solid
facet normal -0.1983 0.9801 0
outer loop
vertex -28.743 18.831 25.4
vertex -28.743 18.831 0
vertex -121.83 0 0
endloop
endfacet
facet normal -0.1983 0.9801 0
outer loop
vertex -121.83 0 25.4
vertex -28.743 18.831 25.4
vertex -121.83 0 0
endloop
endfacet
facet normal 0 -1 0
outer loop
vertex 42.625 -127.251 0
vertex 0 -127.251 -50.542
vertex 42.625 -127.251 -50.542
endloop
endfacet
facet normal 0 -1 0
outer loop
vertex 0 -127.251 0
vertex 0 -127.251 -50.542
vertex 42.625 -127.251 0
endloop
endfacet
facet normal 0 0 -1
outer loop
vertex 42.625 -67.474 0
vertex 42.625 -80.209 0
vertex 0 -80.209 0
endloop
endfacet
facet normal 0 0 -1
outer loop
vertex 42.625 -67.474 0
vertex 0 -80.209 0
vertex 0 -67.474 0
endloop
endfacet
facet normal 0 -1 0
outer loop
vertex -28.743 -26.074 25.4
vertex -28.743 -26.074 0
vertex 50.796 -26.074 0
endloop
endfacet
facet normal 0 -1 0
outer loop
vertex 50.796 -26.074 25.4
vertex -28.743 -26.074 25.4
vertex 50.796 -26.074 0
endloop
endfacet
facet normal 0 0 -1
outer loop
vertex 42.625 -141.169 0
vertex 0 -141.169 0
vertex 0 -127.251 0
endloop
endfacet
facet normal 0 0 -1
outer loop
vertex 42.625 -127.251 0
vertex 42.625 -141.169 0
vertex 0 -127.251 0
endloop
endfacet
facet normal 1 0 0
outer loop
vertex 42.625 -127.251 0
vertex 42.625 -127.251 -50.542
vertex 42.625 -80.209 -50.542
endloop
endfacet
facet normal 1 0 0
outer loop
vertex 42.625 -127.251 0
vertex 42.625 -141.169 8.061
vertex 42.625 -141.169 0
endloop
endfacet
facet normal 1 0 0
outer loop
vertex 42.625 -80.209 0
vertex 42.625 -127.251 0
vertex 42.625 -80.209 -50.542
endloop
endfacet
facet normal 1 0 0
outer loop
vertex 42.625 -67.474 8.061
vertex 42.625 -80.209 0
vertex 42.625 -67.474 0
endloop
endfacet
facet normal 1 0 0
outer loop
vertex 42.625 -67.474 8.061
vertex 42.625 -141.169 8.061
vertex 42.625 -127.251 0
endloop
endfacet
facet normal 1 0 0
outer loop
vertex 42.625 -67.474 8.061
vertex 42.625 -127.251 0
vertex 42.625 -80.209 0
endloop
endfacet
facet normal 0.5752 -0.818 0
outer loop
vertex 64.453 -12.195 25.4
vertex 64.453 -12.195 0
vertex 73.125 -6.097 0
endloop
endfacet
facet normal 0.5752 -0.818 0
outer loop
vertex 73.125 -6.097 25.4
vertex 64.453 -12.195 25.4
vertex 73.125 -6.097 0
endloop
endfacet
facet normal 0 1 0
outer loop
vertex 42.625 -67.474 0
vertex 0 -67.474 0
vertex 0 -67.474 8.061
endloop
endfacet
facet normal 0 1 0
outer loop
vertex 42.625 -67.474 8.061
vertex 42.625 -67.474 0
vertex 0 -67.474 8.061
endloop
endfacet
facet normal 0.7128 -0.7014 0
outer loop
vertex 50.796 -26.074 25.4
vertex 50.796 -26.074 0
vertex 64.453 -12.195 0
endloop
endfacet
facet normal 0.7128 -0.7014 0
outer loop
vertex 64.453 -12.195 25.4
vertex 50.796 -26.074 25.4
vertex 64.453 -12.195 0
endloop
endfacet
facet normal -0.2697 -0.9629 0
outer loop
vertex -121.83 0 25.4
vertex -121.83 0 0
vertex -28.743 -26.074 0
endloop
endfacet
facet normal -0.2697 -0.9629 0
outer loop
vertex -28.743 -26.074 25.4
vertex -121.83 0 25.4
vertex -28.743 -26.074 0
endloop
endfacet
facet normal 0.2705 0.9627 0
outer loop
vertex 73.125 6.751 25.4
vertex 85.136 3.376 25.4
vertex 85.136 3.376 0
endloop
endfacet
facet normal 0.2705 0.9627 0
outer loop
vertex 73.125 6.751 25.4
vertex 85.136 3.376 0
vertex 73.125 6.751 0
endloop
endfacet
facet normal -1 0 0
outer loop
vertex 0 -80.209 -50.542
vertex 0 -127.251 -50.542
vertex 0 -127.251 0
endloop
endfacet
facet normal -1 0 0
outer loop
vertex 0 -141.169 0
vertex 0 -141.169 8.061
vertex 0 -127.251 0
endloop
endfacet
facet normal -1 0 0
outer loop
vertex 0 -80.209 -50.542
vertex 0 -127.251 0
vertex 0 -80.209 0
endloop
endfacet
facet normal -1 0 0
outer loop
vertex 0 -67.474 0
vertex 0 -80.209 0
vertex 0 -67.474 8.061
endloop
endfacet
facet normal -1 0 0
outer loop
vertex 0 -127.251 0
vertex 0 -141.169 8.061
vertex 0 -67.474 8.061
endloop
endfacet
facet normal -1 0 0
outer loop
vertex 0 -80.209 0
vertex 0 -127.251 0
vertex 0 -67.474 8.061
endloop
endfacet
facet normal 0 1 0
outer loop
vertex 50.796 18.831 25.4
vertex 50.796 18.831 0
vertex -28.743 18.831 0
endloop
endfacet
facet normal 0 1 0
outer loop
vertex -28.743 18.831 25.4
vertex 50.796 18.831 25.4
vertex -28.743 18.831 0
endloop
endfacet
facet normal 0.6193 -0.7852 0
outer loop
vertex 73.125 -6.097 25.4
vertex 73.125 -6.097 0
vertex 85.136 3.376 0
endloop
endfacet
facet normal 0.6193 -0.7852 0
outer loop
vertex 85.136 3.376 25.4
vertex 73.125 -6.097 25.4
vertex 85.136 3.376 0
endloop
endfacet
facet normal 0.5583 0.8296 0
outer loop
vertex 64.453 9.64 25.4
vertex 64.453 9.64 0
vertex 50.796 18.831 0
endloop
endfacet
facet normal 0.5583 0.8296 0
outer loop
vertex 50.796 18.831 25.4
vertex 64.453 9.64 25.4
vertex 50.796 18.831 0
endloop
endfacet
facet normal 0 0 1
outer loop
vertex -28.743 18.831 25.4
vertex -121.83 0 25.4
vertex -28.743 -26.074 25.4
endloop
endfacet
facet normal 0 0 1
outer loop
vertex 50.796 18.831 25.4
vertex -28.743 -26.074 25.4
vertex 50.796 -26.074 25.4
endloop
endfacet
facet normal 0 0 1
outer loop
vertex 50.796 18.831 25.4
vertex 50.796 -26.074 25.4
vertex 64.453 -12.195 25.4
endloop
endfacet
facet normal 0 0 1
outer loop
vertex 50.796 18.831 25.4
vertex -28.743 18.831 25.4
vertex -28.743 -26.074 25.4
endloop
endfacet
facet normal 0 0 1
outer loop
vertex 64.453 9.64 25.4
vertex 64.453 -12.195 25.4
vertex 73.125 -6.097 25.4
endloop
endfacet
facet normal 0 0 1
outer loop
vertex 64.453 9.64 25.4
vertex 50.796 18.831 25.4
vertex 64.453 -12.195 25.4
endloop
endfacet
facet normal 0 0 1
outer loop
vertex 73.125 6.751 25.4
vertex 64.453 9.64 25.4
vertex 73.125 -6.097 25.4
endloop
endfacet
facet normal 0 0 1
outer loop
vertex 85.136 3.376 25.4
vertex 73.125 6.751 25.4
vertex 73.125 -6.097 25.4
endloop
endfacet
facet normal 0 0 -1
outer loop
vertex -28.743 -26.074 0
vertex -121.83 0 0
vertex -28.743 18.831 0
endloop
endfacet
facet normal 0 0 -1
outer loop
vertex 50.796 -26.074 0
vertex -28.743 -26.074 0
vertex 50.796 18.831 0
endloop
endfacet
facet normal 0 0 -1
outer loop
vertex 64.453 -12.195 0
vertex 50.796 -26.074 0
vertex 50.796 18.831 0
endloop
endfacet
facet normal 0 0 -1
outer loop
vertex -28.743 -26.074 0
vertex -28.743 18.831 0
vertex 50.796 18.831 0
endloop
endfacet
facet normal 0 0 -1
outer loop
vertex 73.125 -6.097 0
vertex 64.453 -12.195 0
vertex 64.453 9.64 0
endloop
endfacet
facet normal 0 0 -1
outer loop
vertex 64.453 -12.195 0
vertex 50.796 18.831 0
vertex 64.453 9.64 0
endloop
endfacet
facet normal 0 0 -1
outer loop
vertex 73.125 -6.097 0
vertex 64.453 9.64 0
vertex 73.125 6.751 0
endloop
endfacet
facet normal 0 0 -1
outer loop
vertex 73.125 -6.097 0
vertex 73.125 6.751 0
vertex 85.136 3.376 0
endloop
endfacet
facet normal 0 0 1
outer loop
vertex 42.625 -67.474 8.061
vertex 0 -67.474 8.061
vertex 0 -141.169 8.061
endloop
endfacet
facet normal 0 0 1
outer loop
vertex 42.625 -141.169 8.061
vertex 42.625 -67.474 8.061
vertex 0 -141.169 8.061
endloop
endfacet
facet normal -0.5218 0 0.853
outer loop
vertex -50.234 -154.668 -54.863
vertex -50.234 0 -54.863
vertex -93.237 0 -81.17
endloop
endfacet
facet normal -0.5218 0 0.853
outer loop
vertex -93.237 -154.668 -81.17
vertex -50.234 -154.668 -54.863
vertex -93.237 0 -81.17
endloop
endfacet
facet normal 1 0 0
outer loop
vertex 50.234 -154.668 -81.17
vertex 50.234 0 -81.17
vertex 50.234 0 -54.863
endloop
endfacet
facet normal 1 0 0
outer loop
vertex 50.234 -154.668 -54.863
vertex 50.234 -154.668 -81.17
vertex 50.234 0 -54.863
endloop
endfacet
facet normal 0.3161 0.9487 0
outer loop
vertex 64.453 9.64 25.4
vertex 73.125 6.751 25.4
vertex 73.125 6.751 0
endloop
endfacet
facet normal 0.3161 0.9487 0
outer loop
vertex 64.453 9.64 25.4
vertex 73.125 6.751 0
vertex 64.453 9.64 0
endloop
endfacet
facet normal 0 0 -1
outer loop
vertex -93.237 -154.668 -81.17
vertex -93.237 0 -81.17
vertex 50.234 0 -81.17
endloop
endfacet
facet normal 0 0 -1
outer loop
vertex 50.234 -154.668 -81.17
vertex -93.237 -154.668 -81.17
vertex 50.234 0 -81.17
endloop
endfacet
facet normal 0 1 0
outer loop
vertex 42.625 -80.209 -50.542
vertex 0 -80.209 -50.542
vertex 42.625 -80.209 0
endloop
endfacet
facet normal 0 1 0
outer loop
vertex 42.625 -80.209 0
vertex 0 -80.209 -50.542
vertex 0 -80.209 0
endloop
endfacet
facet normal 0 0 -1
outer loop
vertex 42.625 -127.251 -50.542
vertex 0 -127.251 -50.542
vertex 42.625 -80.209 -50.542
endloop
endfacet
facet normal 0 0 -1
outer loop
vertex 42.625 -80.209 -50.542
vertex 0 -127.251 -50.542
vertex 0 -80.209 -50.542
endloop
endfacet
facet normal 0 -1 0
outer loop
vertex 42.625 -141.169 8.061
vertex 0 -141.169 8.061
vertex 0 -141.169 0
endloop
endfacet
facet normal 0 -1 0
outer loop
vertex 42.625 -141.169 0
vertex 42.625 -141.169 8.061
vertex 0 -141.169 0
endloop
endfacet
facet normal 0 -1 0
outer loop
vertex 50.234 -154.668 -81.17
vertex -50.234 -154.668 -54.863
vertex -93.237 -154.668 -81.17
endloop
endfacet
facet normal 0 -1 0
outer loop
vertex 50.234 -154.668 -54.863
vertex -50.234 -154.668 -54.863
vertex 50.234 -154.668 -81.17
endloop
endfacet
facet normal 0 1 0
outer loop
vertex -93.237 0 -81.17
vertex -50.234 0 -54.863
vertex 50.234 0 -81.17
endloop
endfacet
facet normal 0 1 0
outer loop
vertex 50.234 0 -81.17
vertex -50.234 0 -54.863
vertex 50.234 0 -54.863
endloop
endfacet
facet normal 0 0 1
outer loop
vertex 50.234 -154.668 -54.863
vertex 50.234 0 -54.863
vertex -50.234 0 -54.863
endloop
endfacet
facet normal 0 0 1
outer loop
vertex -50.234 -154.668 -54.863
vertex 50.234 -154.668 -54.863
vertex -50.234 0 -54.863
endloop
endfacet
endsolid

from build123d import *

# Parameters (mm, degrees)
F1_DEPTH = 25.4
F2_W     = 45.97038
F2_H     = 13.153464
F3_DEPTH = 154.667571
F4_W     = 47.042668
F4_H     = 50.542254
F5_DEPTH = 42.62463


with BuildPart() as f1:
    # F0 (on Top) → F1 (new body)
    with BuildSketch(Plane.XY):
        Polygon((50.7957, 18.831089), (-28.742667, 18.831089), (-28.742667, -26.074188), (50.7957, -26.074188), (50.7957, -12.194522), (50.7957, 9.640401), align=None)
        Polygon((-28.742667, -26.074188), (-28.742667, 18.831089), (-121.829979, 0), align=None)
        Polygon((64.452626, 9.640401), (50.7957, 9.640401), (50.7957, -12.194522), (64.452626, -12.194522), (64.452626, 0), align=None)
        Polygon((50.7957, -12.194522), (50.7957, -26.074188), (64.452626, -12.194522), align=None)
        Polygon((64.452626, 9.640401), (50.7957, 18.831089), (50.7957, 9.640401), align=None)
        Polygon((73.125139, 6.751092), (64.452626, 9.640401), (64.452626, 0), (64.452626, -12.194522), (68.788882, -6.097261), (73.125139, 0), align=None)
        Polygon((73.125139, -6.097261), (73.125139, 0), (68.788882, -6.097261), align=None)
        Polygon((68.788882, -6.097261), (64.452626, -12.194522), (73.125139, -6.097261), align=None)
        Polygon((85.136034, 3.375546), (73.125139, 0), (73.125139, -6.097261), align=None)
        Polygon((85.136034, 3.375546), (73.125139, 6.751092), (73.125139, 0), align=None)
    extrude(amount=F1_DEPTH)


with BuildPart() as f3:
    # F2 (on Front) → F3 (new body)
    with BuildSketch(Plane.XZ):
        Polygon((50.233737, -54.863125), (22.98519, -54.863125), (22.98519, -68.016589), (-22.98519, -68.016589), (-22.98519, -54.863125), (-50.233737, -54.863125), (-50.233737, -81.170052), (50.233737, -81.170052), (50.233737, -55.656421), align=None)
        Polygon((-50.233737, -81.170052), (-50.233737, -54.863125), (-93.23705, -81.170052), align=None)
        with Locations((0, -61.439857)):
            Rectangle(F2_W, F2_H)
    extrude(amount=F3_DEPTH)


with BuildPart() as f5:
    # F4 (on Right) → F5 (new body)
    with BuildSketch(Plane.YZ):
        with Locations((-103.730023, -25.271127)):
            Rectangle(F4_W, F4_H)
        Polygon((-127.251357, 0), (-80.208689, 0), (-67.474343, 0), (-67.474343, 8.06065), (-141.169086, 8.06065), (-141.169086, 0), align=None)
    extrude(amount=F5_DEPTH)


solid = Compound([f1.part, f3.part, f5.part])
